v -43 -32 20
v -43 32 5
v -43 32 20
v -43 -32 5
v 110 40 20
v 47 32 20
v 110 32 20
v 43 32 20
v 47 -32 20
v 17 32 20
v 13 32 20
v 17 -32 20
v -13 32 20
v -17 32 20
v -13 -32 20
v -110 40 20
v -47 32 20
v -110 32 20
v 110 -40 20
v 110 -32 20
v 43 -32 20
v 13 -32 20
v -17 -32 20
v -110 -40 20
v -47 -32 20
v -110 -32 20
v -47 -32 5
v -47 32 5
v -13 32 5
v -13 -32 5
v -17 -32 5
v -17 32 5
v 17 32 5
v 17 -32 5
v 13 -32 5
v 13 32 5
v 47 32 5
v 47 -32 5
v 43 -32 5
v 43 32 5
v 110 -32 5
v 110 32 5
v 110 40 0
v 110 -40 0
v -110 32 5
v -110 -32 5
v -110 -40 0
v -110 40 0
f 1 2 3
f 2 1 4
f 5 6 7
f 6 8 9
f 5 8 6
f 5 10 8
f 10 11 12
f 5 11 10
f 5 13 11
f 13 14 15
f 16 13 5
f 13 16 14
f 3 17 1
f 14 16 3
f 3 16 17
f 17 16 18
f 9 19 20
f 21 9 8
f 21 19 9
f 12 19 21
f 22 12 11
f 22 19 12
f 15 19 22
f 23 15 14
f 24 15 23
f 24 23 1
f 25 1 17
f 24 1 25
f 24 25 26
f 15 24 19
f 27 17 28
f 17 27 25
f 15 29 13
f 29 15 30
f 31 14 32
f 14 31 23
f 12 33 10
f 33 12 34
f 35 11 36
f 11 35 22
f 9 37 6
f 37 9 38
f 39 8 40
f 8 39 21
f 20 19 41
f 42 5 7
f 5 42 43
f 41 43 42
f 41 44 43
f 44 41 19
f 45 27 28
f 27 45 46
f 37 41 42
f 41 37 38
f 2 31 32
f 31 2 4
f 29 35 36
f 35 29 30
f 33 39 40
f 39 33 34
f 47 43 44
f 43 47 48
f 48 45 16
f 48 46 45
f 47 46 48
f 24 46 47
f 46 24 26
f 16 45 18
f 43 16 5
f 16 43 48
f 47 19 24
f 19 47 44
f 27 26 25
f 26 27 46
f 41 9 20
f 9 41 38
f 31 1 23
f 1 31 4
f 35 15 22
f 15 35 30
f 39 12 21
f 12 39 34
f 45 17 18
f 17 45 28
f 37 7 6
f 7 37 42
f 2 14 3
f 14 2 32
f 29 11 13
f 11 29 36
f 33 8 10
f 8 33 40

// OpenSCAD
$fn = 32;

// ----------------------------------------------------------------------
// Rib frame 220 x 80 x 20
// 4 ribs at 30 mm pitch
// ----------------------------------------------------------------------

// --- parameters (mm) ---
frame = [220, 80, 5];  // base plate size (x, y, z)
rail_w = 8;            // side rail width
ribs = 4;              // number of ribs
rib_t = 4;             // rib thickness
rib_h = 15;            // rib height above the base plate
pitch = 30;            // pitch between rib centres

// --- derived feature positions (mm) ---
span = (ribs - 1) * pitch;          // = 90   distance between the outer ribs
origin_x = -span / 2;               // = -45   X of the first rib
rib_len = frame[1] - 2 * rail_w + 2;  // = 66   rib length, 1 mm into each rail
feature_centers = [
  [origin_x + 0 * pitch, 0],
  [origin_x + 1 * pitch, 0],
  [origin_x + 2 * pitch, 0],
  [origin_x + 3 * pitch, 0]
];   // rib centre line, drives the rib loop

// base plate, two side rails, then the ribs read straight off feature_centers
union() {
  translate([-frame[0] / 2, -frame[1] / 2, 0]) cube(frame);
  translate([-frame[0] / 2, -frame[1] / 2, 0]) cube([frame[0], rail_w, frame[2] + rib_h]);
  translate([-frame[0] / 2, frame[1] / 2 - rail_w, 0]) cube([frame[0], rail_w, frame[2] + rib_h]);
  for (centre = feature_centers)
    translate([centre[0] - rib_t / 2, centre[1] - rib_len / 2, frame[2] - 1])
      cube([rib_t, rib_len, rib_h + 1]);
}
